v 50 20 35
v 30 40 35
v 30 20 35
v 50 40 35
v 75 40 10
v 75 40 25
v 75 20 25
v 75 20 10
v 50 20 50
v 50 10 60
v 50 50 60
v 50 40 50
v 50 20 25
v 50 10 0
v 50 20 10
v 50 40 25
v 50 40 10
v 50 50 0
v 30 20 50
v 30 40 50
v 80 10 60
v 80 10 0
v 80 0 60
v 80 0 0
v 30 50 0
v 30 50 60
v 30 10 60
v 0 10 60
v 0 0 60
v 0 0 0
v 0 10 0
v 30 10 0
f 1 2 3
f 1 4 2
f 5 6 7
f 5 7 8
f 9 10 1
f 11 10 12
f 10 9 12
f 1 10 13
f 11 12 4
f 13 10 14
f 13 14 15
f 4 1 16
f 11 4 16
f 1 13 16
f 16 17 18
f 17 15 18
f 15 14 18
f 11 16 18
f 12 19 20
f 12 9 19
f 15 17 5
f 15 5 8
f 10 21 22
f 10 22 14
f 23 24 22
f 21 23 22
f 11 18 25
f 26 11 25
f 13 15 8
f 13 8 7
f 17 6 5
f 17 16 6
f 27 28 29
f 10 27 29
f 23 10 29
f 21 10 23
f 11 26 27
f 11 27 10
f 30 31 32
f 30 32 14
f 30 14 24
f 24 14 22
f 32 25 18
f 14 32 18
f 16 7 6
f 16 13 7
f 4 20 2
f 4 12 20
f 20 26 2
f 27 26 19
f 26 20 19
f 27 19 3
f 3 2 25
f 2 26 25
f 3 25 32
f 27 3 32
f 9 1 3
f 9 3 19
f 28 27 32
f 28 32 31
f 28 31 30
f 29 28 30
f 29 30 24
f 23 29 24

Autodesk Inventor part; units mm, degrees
ref_plane "YZ Plane" through (0, 0, 0) normal (1, 0, 0) x (0, 1, 0)
ref_plane "XZ Plane" through (0, 0, 0) normal (0, 1, 0) x (-1, 0, 0)
ref_plane "XY Plane" through (0, 0, 0) normal (0, 0, 1) x (1, 0, 0)
sketch "Sketch1" plane through (0, 0, 0) normal (0, 0, 1) x (1, 0, 0)
  line L0 (0, 0) -> (80, 0)
  line L1 (80, 0) -> (80, 10)
  line L2 (80, 10) -> (50, 10)
  line L3 (50, 10) -> (50, 50)
  line L4 (50, 50) -> (30, 50)
  line L5 (30, 50) -> (30, 10)
  line L6 (30, 10) -> (0, 10)
  line L7 (0, 10) -> (0, 0)
  dimension "d0" = 80
  dimension "d1" = 10
  dimension "d2" = 40
extrude "Extrusion1" add sketch "Sketch1" along normal blind 60
sketch "Sketch2" plane through (50, 10, 0) normal (1, 0, 0) x (0, 0, -1)
  line L0 (-10, 10) -> (-25, 10)
  line L1 (-25, 10) -> (-25, 30)
  line L2 (-25, 30) -> (-10, 30)
  line L3 (-10, 30) -> (-10, 10)
  line L4 (-50, 30) -> (-50, 10)
  line L5 (-50, 10) -> (-35, 10)
  line L6 (-35, 10) -> (-35, 30)
  line L7 (-35, 30) -> (-50, 30)
  point P0 (0, -10)
extrude "Extrusion2" add sketch "Sketch2" along normal blind 25 contours L0 L1 L2 L3
sketch "Sketch3" plane through (50, 10, 0) normal (1, 0, 0) x (0, 0, -1)
  line L0 (-35, 30) -> (-35, 10)
  line L1 (-35, 10) -> (-50, 10)
  line L2 (-50, 10) -> (-50, 30)
  line L3 (-60, 40) -> (-60, 0) projected
  line L4 (-50, 30) -> (-35, 30)
  point P0 (0, -10)
extrude "Extrusion3" cut sketch "Sketch3" against normal blind 20
properties part number "P3-8"
